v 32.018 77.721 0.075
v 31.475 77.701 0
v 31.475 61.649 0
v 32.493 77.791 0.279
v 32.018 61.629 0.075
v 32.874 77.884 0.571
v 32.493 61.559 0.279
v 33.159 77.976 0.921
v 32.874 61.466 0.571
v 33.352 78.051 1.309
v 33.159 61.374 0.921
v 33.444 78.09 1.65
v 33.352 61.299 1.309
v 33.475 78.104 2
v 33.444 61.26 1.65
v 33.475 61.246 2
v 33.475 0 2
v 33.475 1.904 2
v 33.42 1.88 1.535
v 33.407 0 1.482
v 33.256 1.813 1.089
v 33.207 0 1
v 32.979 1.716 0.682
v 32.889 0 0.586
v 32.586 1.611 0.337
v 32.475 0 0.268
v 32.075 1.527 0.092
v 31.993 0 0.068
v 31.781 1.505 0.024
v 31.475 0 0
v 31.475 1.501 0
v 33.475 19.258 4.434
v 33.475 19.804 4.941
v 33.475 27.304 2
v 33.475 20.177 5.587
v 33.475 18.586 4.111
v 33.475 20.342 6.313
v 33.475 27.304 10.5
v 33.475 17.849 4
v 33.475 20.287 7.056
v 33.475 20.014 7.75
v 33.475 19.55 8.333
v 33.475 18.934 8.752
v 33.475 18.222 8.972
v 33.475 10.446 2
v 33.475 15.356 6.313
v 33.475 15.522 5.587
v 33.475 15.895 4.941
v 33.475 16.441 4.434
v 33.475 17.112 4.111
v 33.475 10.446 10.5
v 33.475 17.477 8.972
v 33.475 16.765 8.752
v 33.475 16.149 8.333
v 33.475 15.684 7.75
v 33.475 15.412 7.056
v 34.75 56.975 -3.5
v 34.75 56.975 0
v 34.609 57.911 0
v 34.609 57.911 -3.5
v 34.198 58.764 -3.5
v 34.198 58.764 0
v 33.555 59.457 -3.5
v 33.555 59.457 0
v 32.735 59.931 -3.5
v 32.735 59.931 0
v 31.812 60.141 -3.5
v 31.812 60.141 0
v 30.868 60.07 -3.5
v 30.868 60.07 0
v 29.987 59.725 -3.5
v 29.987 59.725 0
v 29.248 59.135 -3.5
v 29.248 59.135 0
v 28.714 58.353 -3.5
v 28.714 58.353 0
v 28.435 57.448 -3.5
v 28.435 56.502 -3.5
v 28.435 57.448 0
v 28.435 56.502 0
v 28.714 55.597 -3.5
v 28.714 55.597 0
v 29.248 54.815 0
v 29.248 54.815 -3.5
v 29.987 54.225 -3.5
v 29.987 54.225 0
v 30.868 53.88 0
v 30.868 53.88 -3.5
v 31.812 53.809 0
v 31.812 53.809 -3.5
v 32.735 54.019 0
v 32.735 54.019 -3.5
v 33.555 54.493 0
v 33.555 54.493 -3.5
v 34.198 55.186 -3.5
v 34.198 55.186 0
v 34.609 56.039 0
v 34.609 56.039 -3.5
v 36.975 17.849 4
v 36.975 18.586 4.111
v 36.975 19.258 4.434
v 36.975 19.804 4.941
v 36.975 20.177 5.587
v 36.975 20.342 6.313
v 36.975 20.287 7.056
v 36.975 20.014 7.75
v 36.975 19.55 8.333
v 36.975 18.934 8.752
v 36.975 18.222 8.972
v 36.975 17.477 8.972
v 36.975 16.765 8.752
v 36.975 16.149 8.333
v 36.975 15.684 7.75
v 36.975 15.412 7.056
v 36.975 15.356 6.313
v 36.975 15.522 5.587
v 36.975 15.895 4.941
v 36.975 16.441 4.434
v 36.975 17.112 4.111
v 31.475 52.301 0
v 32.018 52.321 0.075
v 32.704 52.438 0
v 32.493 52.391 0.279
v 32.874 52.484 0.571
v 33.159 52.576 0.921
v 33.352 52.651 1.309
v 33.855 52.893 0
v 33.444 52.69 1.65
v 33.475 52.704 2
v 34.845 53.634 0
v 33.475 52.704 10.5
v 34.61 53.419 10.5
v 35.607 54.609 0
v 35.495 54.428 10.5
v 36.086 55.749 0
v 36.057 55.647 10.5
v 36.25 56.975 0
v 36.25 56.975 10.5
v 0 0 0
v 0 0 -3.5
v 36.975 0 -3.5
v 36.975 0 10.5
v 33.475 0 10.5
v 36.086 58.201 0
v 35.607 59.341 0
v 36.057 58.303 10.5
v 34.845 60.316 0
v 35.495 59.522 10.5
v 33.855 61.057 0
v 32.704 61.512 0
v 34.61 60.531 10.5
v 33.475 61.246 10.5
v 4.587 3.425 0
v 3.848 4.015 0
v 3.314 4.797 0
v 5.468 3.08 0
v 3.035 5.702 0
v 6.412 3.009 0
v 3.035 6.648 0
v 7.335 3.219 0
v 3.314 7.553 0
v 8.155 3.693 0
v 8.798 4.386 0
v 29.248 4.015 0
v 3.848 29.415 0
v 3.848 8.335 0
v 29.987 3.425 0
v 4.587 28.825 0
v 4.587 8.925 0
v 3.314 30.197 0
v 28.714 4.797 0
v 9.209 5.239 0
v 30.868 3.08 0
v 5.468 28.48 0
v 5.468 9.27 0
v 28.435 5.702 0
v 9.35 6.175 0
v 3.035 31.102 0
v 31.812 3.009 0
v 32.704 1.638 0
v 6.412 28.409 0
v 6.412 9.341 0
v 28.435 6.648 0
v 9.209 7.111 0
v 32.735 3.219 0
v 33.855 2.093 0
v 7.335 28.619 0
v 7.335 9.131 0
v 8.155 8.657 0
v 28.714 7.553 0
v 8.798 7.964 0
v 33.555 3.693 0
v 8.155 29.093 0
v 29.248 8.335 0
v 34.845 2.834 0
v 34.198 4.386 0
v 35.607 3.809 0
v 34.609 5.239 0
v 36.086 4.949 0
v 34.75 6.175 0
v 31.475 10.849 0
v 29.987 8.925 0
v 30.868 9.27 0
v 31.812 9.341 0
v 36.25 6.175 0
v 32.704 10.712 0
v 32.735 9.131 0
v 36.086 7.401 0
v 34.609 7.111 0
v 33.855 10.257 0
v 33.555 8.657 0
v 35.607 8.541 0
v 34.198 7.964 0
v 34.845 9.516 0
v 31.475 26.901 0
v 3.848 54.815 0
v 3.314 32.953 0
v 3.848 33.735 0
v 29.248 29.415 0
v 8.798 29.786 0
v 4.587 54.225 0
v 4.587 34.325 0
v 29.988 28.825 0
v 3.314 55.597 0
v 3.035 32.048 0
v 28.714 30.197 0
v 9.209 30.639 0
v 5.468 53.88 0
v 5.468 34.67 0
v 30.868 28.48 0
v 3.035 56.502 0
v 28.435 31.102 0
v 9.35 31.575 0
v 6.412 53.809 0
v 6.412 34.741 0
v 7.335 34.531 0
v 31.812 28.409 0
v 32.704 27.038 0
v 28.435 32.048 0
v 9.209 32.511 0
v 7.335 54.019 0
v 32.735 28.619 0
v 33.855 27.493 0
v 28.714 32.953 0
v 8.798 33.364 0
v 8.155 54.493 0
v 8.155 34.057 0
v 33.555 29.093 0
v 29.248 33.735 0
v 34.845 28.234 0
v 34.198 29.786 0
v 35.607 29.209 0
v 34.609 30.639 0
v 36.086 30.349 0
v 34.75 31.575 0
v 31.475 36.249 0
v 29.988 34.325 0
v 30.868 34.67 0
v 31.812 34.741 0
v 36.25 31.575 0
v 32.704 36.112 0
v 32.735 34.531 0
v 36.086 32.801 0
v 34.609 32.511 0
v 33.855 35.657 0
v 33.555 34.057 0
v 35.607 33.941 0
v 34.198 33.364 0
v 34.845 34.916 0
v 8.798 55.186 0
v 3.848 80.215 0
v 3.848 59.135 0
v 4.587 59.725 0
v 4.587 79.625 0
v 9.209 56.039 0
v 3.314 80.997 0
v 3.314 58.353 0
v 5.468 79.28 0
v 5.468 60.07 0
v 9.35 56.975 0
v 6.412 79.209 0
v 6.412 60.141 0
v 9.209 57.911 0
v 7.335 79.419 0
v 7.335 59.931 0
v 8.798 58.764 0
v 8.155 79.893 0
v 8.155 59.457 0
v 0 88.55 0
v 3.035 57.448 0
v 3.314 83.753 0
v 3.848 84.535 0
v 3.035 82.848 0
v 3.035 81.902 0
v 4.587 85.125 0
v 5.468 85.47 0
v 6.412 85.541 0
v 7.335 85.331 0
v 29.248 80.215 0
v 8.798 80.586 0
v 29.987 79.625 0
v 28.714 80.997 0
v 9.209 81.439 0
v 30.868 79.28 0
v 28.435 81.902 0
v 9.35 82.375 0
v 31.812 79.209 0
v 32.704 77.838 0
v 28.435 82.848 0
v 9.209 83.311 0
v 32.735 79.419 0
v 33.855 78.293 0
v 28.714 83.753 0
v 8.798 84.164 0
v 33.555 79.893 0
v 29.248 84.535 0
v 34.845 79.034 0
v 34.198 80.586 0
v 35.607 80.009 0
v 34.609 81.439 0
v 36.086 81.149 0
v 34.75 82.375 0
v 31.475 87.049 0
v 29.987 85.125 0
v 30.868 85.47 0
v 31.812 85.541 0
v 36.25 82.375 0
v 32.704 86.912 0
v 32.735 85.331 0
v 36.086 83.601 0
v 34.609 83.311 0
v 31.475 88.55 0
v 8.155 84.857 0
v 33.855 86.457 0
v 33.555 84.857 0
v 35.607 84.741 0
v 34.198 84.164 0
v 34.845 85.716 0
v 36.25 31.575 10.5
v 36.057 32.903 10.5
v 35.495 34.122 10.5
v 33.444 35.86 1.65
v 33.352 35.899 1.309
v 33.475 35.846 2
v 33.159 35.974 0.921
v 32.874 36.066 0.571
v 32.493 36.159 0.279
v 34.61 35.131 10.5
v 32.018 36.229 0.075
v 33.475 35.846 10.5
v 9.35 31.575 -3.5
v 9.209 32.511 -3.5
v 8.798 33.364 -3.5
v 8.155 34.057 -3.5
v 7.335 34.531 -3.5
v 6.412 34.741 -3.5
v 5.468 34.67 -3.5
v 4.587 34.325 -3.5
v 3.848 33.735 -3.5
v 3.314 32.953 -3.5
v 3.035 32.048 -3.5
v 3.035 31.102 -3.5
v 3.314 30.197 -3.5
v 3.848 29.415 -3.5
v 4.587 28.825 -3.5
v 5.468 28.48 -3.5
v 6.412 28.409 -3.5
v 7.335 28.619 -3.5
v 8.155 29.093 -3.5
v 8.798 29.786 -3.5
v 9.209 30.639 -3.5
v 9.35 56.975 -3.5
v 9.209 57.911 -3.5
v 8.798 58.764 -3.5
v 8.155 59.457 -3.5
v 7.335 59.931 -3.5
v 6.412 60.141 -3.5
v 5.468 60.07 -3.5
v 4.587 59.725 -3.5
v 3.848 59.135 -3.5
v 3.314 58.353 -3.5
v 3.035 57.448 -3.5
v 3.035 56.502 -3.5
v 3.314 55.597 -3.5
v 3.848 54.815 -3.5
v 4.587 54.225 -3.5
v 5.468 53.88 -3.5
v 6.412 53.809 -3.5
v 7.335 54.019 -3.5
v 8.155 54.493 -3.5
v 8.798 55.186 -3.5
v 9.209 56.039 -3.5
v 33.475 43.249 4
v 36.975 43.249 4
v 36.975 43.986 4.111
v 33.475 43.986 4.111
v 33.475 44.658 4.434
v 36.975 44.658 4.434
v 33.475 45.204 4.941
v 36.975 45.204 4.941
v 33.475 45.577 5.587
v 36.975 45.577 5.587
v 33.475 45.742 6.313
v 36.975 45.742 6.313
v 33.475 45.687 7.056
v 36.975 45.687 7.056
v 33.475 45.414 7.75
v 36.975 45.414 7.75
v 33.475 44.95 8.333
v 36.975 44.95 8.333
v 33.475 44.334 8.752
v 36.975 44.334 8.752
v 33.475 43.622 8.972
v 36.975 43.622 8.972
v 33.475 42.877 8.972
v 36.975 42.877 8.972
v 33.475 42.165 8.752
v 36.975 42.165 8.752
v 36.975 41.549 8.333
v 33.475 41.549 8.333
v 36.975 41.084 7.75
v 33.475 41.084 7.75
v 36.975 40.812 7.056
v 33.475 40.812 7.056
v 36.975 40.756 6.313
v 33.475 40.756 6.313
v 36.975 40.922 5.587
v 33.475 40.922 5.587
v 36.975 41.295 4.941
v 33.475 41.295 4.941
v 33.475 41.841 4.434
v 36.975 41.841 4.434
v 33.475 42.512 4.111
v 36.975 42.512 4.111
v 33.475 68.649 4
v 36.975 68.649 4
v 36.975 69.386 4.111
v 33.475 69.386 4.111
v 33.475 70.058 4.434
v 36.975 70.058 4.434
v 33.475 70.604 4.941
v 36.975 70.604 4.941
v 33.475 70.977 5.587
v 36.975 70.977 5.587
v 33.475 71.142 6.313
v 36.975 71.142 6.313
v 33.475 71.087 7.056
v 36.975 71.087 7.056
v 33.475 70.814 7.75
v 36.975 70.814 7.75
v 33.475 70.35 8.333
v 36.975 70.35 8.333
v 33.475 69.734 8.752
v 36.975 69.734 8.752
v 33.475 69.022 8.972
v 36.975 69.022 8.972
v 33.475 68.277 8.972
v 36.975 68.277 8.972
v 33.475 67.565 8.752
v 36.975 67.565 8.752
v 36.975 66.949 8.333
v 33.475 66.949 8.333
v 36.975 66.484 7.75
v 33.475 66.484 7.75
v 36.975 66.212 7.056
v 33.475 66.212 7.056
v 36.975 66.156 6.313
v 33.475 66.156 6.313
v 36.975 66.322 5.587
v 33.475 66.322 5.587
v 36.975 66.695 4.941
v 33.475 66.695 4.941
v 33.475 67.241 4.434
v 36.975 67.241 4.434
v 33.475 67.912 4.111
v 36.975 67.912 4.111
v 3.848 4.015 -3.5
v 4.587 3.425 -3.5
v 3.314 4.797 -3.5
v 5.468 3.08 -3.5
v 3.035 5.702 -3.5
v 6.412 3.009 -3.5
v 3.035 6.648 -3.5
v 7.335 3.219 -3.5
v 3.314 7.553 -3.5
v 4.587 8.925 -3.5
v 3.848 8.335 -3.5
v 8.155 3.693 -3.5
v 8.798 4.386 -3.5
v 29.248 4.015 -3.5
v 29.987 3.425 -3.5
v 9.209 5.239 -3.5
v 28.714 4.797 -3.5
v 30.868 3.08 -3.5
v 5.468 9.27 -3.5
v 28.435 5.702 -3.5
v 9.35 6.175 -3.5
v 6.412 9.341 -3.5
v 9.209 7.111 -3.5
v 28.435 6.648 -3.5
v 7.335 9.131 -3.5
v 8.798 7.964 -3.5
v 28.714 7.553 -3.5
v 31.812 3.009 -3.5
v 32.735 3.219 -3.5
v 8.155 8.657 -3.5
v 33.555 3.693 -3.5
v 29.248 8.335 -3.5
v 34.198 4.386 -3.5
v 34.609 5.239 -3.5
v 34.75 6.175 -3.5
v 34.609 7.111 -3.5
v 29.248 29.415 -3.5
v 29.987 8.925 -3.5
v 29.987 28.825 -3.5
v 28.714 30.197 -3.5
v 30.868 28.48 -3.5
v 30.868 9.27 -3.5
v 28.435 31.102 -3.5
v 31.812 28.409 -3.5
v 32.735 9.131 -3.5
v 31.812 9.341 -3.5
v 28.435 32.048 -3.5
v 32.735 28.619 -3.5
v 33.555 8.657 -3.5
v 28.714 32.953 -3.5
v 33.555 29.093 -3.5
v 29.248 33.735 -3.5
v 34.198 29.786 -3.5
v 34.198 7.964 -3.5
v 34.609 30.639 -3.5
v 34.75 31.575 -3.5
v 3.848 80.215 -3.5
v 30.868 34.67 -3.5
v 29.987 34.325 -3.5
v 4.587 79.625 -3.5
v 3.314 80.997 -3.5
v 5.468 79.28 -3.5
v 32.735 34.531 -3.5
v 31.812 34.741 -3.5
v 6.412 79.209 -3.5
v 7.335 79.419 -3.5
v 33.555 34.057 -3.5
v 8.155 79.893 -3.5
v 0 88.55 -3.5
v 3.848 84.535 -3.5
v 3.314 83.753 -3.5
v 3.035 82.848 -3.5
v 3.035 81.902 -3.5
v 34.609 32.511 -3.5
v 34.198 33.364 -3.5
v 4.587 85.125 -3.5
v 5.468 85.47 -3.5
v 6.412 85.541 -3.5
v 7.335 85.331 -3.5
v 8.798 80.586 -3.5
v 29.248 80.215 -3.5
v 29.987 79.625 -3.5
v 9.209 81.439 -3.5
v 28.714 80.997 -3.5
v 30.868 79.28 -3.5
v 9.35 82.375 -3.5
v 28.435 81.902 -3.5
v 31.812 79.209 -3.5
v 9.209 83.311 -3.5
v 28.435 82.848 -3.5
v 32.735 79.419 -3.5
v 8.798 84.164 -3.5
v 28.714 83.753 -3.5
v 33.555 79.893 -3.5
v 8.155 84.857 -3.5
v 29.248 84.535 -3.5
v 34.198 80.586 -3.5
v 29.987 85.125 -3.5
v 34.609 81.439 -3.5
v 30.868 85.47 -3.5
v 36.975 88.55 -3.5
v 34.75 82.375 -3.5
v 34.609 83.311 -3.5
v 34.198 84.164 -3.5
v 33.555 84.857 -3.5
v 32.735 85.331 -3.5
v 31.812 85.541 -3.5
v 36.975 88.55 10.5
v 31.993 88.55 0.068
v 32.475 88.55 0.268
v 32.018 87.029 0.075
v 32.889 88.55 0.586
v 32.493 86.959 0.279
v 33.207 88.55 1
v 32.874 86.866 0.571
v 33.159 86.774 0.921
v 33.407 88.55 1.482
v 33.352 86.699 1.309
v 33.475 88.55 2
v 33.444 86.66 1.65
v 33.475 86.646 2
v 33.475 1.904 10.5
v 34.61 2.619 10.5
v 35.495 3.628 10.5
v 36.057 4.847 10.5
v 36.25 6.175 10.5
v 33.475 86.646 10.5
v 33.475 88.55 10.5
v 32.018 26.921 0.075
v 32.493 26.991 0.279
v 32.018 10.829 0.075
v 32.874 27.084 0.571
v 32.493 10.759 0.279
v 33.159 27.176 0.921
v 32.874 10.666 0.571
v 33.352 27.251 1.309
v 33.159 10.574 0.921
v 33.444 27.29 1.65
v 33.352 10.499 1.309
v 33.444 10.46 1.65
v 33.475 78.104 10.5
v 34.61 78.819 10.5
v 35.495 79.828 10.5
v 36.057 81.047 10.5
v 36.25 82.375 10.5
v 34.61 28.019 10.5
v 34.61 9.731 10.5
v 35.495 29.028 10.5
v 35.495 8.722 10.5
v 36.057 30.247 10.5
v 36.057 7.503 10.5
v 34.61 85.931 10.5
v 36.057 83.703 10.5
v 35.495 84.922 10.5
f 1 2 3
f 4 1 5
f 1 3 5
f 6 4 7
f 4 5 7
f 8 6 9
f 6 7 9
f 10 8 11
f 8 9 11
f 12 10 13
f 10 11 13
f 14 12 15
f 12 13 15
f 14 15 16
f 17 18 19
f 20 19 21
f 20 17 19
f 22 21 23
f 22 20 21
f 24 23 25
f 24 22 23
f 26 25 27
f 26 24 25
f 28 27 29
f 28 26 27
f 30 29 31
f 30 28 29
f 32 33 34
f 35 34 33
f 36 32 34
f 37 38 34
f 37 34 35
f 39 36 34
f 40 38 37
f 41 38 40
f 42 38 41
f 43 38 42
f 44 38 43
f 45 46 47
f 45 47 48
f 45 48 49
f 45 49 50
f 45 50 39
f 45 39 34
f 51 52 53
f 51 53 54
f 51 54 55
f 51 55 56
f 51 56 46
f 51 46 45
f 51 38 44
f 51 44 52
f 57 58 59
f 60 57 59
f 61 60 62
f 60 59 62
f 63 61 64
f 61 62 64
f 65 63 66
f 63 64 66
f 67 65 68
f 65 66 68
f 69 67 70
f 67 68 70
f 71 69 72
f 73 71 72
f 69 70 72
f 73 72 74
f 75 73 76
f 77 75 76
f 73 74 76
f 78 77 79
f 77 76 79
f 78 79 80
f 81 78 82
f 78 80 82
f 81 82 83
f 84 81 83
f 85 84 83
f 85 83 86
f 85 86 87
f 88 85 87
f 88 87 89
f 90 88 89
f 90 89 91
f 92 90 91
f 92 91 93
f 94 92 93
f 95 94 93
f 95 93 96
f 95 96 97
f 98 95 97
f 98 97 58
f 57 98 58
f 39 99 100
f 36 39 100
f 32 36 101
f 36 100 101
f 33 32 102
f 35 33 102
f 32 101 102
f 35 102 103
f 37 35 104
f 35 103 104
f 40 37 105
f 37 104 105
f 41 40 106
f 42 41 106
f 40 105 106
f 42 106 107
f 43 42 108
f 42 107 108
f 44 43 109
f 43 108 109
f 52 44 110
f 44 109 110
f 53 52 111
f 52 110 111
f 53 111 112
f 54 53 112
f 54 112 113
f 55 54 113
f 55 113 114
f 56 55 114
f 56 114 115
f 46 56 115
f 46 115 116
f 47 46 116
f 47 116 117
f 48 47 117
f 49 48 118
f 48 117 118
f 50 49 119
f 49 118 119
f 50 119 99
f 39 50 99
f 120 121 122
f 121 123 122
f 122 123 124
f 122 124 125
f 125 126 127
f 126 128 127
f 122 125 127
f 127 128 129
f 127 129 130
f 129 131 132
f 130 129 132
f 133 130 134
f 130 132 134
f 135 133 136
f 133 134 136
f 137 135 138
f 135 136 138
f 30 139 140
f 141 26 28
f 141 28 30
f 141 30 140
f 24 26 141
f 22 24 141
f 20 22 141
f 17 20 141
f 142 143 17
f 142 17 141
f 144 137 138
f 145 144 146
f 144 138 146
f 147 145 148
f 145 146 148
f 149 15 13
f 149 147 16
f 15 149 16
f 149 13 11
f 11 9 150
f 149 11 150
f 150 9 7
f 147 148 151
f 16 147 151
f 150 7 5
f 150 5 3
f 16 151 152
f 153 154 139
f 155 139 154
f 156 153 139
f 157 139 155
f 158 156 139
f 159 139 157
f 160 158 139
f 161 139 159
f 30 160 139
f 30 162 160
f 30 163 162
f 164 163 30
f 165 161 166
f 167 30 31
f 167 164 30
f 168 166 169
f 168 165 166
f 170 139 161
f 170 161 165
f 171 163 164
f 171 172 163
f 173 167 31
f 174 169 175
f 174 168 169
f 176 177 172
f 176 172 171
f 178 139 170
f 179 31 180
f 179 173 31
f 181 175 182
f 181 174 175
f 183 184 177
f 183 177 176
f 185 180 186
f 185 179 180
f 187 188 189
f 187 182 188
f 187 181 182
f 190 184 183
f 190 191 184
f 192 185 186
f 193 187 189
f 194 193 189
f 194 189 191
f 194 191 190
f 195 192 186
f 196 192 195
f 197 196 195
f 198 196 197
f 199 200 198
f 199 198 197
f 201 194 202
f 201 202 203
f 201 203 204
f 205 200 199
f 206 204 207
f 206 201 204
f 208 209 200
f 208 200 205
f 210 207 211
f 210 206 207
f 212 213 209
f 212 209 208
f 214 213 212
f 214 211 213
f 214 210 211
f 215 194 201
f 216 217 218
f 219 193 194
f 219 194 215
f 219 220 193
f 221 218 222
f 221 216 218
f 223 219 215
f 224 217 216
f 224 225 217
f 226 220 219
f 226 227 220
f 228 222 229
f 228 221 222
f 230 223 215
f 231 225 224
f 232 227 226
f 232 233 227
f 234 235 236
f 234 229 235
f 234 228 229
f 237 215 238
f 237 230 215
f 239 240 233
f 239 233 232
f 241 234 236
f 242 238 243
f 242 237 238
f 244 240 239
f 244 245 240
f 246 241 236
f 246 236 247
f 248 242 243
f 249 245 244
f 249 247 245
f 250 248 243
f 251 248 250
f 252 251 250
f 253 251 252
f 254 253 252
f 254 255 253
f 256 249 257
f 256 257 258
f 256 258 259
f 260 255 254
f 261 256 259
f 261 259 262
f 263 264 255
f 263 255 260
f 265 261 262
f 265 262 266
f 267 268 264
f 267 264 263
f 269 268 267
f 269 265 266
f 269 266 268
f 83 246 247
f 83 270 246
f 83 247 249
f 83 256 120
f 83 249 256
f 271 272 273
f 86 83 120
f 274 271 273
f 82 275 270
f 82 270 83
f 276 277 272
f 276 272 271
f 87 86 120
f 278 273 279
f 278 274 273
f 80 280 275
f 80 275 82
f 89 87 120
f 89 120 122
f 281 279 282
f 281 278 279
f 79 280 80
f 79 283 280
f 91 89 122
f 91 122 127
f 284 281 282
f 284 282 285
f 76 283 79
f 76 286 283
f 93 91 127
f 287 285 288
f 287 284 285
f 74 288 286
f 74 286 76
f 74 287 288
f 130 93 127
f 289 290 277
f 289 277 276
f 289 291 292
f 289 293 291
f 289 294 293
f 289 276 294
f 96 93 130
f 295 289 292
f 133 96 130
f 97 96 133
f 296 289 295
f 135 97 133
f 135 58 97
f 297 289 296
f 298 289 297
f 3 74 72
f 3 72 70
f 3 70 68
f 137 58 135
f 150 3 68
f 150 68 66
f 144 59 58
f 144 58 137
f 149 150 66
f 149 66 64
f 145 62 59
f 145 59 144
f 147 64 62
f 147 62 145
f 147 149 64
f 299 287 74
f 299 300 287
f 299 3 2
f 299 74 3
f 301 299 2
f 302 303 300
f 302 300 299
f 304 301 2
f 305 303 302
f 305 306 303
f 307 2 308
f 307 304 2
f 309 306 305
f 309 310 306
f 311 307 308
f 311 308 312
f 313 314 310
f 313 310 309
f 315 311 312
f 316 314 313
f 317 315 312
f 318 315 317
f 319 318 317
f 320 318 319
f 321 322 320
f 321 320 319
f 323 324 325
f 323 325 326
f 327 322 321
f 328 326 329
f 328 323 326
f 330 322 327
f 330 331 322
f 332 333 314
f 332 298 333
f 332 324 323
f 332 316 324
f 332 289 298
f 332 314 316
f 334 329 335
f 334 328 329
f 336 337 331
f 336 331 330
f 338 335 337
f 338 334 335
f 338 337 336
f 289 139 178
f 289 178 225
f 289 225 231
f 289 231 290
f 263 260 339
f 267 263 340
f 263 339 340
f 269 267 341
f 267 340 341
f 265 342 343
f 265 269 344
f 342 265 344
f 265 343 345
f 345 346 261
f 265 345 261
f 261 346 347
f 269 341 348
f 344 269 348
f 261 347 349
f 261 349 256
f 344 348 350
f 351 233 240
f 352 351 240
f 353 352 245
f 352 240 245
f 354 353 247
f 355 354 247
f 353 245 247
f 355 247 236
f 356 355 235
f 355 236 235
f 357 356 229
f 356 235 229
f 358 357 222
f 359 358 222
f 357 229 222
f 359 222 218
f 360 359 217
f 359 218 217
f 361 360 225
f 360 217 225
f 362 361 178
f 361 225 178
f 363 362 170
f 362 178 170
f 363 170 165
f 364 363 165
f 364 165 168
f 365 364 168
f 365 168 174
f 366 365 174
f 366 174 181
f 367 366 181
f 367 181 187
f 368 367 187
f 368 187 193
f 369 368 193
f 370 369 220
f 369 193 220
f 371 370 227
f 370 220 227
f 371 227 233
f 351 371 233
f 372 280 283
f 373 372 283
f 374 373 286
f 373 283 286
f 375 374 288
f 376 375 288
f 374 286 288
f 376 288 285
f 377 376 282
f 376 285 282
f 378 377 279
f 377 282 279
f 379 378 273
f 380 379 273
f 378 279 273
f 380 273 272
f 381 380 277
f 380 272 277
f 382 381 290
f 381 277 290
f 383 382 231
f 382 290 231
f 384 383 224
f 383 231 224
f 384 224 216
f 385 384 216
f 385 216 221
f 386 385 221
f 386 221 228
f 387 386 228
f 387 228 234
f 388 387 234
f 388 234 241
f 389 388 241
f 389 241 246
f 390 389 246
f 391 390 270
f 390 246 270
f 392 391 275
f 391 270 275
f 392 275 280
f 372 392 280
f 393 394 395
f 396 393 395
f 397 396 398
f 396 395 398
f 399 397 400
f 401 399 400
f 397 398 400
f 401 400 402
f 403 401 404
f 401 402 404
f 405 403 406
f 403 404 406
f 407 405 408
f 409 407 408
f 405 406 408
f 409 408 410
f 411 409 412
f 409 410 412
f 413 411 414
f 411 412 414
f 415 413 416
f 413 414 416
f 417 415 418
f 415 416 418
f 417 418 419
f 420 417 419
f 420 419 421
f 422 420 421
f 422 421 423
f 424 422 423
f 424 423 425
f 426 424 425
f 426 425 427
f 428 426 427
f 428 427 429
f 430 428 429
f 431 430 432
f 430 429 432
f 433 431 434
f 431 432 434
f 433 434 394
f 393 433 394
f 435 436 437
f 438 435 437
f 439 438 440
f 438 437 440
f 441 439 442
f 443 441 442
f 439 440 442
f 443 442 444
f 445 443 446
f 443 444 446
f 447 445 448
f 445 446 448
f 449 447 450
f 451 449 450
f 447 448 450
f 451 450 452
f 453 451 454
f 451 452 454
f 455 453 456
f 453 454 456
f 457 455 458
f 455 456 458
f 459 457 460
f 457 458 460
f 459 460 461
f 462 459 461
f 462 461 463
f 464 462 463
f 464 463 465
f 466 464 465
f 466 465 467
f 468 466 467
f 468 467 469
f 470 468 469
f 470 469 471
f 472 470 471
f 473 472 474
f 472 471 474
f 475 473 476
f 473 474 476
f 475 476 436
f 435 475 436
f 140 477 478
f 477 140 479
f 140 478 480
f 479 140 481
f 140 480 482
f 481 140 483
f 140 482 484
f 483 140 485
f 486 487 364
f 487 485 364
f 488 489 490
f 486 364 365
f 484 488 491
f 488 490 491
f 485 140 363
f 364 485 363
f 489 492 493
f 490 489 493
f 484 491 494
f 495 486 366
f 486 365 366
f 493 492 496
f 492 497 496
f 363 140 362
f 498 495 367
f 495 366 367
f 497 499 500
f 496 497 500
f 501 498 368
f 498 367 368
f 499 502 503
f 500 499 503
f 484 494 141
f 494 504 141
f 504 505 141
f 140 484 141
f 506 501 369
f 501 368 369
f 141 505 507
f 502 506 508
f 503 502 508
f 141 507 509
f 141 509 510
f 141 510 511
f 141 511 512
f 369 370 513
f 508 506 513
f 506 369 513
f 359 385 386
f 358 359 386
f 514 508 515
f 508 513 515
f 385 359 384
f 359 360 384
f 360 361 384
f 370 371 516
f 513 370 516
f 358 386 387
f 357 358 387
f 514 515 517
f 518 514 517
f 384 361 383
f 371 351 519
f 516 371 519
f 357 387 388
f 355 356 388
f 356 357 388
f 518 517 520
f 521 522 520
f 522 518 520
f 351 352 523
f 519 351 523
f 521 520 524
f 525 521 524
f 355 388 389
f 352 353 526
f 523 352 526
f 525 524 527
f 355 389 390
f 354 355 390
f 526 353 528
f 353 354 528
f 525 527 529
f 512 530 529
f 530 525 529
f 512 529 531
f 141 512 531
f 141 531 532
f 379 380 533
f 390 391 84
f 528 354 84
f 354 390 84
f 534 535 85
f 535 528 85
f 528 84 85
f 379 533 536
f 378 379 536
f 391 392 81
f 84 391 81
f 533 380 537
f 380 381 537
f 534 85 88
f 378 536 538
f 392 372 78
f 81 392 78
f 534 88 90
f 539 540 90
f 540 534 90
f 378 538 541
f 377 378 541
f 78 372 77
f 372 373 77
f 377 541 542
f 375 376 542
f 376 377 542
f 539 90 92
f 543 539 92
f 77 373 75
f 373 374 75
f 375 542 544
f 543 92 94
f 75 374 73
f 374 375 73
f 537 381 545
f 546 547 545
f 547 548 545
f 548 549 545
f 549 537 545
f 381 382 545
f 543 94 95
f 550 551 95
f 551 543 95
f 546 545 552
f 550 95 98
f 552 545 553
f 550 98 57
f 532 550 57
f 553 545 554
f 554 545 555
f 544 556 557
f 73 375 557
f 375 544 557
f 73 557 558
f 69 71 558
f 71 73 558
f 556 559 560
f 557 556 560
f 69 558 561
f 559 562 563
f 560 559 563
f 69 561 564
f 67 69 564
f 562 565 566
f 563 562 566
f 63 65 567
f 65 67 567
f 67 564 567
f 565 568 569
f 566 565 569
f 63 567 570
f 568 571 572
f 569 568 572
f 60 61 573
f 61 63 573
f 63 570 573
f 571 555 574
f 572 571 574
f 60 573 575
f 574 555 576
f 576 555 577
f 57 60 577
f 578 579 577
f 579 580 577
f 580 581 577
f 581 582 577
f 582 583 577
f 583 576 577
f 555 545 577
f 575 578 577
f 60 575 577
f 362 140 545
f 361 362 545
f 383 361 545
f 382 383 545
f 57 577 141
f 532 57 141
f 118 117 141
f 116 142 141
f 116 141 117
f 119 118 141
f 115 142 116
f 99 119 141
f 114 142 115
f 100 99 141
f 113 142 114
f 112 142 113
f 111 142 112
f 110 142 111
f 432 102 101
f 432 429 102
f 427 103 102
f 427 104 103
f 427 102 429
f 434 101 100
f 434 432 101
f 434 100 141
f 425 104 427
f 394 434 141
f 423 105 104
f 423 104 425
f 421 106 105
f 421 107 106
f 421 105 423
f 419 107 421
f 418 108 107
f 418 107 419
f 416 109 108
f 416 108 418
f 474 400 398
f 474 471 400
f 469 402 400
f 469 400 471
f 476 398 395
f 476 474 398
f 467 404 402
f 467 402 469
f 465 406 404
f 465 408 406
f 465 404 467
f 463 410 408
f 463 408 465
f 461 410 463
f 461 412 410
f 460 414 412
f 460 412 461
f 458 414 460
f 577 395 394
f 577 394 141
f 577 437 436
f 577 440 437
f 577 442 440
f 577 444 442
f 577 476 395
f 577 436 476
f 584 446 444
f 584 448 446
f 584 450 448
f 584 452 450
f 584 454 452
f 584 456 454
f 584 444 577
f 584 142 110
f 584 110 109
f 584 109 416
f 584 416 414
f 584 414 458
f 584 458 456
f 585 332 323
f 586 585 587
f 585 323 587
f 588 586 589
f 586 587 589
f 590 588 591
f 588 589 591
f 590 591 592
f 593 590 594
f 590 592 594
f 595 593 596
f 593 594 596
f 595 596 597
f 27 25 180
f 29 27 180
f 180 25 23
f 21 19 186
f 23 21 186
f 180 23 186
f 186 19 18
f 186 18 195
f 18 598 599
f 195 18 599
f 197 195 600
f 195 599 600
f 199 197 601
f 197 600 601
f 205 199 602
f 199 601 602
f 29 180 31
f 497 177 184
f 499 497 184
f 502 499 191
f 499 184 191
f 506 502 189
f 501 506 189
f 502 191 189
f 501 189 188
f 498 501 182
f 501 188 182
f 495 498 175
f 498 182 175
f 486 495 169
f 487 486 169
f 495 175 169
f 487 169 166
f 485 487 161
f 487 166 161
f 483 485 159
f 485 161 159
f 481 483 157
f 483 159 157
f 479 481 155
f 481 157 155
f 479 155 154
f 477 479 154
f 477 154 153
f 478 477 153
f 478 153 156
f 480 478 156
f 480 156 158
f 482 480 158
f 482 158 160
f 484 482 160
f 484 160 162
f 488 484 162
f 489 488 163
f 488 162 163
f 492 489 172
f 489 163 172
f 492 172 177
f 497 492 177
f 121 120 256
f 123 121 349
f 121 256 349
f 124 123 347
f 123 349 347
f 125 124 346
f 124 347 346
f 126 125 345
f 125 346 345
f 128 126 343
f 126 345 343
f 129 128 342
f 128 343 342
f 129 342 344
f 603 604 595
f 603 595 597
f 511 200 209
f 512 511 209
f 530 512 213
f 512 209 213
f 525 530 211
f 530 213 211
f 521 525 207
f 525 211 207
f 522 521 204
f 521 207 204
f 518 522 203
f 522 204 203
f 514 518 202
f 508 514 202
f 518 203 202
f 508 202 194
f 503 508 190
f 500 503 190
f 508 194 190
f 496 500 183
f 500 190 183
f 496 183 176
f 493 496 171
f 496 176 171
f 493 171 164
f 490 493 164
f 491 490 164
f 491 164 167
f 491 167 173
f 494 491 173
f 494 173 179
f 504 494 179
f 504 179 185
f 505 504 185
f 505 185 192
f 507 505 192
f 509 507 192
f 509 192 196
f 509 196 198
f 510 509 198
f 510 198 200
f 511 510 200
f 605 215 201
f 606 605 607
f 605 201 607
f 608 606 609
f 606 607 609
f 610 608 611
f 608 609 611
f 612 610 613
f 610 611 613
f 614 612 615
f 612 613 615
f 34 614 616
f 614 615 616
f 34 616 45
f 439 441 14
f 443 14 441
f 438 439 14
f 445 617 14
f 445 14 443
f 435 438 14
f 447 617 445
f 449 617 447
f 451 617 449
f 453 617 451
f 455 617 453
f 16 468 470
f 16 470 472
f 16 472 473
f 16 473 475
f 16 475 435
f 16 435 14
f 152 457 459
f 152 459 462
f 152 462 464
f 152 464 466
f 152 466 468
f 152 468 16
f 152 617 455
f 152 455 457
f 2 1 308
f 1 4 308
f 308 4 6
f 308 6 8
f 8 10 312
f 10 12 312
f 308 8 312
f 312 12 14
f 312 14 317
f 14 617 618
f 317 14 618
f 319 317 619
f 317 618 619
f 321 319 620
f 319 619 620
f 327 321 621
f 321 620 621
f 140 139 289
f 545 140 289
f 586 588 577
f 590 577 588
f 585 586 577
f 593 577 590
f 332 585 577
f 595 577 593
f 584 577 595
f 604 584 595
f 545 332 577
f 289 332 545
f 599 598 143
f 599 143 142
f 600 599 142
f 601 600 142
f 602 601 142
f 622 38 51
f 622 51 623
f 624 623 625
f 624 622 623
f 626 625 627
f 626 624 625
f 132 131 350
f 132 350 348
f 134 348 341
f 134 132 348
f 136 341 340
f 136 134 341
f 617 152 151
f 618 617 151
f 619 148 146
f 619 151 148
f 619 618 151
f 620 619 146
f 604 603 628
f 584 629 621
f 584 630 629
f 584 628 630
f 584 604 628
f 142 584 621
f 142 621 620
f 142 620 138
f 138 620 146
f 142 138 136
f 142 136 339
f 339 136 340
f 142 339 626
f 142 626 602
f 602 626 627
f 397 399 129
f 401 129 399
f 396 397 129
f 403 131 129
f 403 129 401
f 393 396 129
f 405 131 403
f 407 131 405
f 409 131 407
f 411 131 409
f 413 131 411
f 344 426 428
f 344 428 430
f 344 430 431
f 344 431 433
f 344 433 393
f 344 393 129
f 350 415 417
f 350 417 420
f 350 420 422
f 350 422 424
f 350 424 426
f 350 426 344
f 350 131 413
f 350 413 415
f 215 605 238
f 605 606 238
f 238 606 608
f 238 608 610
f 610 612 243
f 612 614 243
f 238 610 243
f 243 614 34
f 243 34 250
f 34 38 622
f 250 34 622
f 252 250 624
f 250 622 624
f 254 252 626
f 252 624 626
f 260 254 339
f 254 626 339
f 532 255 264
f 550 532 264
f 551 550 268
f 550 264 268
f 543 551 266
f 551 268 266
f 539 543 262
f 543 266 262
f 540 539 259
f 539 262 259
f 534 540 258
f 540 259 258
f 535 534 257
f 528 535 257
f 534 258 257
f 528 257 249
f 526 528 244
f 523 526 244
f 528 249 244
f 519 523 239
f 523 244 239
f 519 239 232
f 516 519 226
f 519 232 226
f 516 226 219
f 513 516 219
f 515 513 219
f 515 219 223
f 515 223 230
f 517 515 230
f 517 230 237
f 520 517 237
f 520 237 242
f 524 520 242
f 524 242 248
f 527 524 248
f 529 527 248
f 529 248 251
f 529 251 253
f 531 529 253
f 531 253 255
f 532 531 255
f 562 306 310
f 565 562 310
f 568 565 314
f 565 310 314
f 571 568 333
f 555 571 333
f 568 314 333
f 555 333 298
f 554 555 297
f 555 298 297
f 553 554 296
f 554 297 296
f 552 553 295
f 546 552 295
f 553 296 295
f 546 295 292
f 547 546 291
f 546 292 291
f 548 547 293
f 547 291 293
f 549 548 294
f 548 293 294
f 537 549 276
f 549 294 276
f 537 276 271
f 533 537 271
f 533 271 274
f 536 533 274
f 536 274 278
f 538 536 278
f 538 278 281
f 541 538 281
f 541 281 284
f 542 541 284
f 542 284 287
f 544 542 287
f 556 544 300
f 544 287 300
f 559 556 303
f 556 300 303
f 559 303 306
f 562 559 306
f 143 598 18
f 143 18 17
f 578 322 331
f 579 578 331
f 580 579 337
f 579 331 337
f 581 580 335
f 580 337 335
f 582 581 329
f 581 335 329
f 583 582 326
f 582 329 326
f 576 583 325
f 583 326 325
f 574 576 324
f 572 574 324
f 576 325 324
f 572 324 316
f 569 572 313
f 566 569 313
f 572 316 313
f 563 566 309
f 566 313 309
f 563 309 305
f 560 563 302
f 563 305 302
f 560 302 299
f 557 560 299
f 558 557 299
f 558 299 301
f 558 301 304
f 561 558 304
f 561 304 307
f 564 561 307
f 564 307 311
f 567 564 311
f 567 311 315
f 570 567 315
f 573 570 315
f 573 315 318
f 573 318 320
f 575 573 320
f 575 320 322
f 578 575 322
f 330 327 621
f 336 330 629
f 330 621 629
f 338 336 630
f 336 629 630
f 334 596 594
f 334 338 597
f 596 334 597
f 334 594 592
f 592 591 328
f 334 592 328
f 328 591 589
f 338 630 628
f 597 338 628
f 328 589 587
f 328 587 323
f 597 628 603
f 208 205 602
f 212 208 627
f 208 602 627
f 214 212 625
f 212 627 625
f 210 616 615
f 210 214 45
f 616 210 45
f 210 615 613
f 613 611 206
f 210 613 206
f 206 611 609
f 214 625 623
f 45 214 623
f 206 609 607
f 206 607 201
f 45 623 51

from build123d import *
from build123d.topology import SkipClean

# Parameters (mm, degrees)
SKETCH1_W           = 36.97504
SKETCH1_H           = 88.55
SKETCH1_R           = 3.175
BOSS_EXTRUDE1_DEPTH = 3.5
BOSS_EXTRUDE3_START = 10.5
BOSS_EXTRUDE3_DEPTH = 10.5
CUT_EXTRUDE1_START  = 10.5
CUT_EXTRUDE1_DEPTH  = 10.5
SKETCH2_R           = 2.5
CUT_EXTRUDE2_DEPTH  = 3.5
FILLET1_R           = 2


with BuildPart() as part:
    # Sketch1 → Boss-Extrude1 (new body)
    with BuildSketch(Plane.XY):
        with Locations((18.48752, 44.275)):
            Rectangle(SKETCH1_W, SKETCH1_H)
        with Locations((31.575, 82.375)):
            Circle(SKETCH1_R, mode=Mode.SUBTRACT)
        with Locations((31.575, 56.975)):
            Circle(SKETCH1_R, mode=Mode.SUBTRACT)
        with Locations((31.575, 31.575)):
            Circle(SKETCH1_R, mode=Mode.SUBTRACT)
        with Locations((31.575, 6.175)):
            Circle(SKETCH1_R, mode=Mode.SUBTRACT)
        with Locations((6.175, 6.175)):
            Circle(SKETCH1_R, mode=Mode.SUBTRACT)
        with Locations((6.175, 31.575)):
            Circle(SKETCH1_R, mode=Mode.SUBTRACT)
        with Locations((6.175, 56.975)):
            Circle(SKETCH1_R, mode=Mode.SUBTRACT)
        with Locations((6.175, 82.375)):
            Circle(SKETCH1_R, mode=Mode.SUBTRACT)
    extrude(amount=-BOSS_EXTRUDE1_DEPTH)

    # Sketch1<4> → Boss-Extrude3 (add)
    with SkipClean():  # the faces are left unmerged after this step: merging them gives an invalid solid
        with BuildSketch(Plane.XY.offset(BOSS_EXTRUDE3_START)):
            with BuildLine():
                Line((33.47504, 0), (36.97504, 0))
                Line((36.97504, 0), (36.97504, 88.55))
                Line((36.97504, 88.55), (33.47504, 88.55))
                Line((33.47504, 88.55), (33.47504, 84.918712444))
                ThreePointArc((33.47504, 84.918712444), (34.75, 82.375), (33.47504, 79.831287556))
                Line((33.47504, 79.831287556), (33.47504, 59.518712444))
                ThreePointArc((33.47504, 59.518712444), (34.75, 56.975), (33.47504, 54.431287556))
                Line((33.47504, 54.431287556), (33.47504, 34.118712444))
                ThreePointArc((33.47504, 34.118712444), (34.75, 31.575), (33.47504, 29.031287556))
                Line((33.47504, 29.031287556), (33.47504, 8.718712444))
                ThreePointArc((33.47504, 8.718712444), (34.75, 6.175), (33.47504, 3.631287556))
                Line((33.47504, 3.631287556), (33.47504, 0))
            make_face()
        extrude(amount=-BOSS_EXTRUDE3_DEPTH)

    # Sketch1<5> → Cut-Extrude1 (cut)
    with BuildSketch(Plane.XY.offset(CUT_EXTRUDE1_START)):
        with BuildLine():
            ThreePointArc((36.25, 82.375), (35.495351515, 84.921854727), (33.47504, 86.646471994))
            Line((33.47504, 86.646471994), (33.47504, 84.918712444))
            ThreePointArc((33.47504, 84.918712444), (34.413419631, 83.797673188), (34.75, 82.375))
            ThreePointArc((34.75, 82.375), (34.413419631, 80.952326812), (33.47504, 79.831287556))
            Line((33.47504, 79.831287556), (33.47504, 78.103528006))
            ThreePointArc((33.47504, 78.103528006), (35.495351515, 79.828145273), (36.25, 82.375))
        make_face()
        with BuildLine():
            Line((33.47504, 84.918712444), (33.47504, 86.646471994))
            ThreePointArc((33.47504, 86.646471994), (26.9, 82.375), (33.47504, 78.103528006))
            Line((33.47504, 78.103528006), (33.47504, 79.831287556))
            ThreePointArc((33.47504, 79.831287556), (28.4, 82.375), (33.47504, 84.918712444))
        make_face()
        with BuildLine():
            ThreePointArc((36.25, 56.975), (35.495351515, 59.521854727), (33.47504, 61.246471994))
            Line((33.47504, 61.246471994), (33.47504, 59.518712444))
            ThreePointArc((33.47504, 59.518712444), (34.413419631, 58.397673188), (34.75, 56.975))
            ThreePointArc((34.75, 56.975), (34.413419631, 55.552326812), (33.47504, 54.431287556))
            Line((33.47504, 54.431287556), (33.47504, 52.703528006))
            ThreePointArc((33.47504, 52.703528006), (35.495351515, 54.428145273), (36.25, 56.975))
        make_face()
        with BuildLine():
            Line((33.47504, 59.518712444), (33.47504, 61.246471994))
            ThreePointArc((33.47504, 61.246471994), (26.9, 56.975), (33.47504, 52.703528006))
            Line((33.47504, 52.703528006), (33.47504, 54.431287556))
            ThreePointArc((33.47504, 54.431287556), (28.4, 56.975), (33.47504, 59.518712444))
        make_face()
        with BuildLine():
            ThreePointArc((33.47504, 35.846471994), (26.9, 31.575), (33.47504, 27.303528006))
            Line((33.47504, 27.303528006), (33.47504, 29.031287556))
            ThreePointArc((33.47504, 29.031287556), (28.4, 31.575), (33.47504, 34.118712444))
            Line((33.47504, 34.118712444), (33.47504, 35.846471994))
        make_face()
        with BuildLine():
            Line((33.47504, 29.031287556), (33.47504, 27.303528006))
            ThreePointArc((33.47504, 27.303528006), (35.495351515, 29.028145273), (36.25, 31.575))
            ThreePointArc((36.25, 31.575), (35.495351515, 34.121854727), (33.47504, 35.846471994))
            Line((33.47504, 35.846471994), (33.47504, 34.118712444))
            ThreePointArc((33.47504, 34.118712444), (34.413419631, 32.997673188), (34.75, 31.575))
            ThreePointArc((34.75, 31.575), (34.413419631, 30.152326812), (33.47504, 29.031287556))
        make_face()
        with BuildLine():
            ThreePointArc((33.47504, 10.446471994), (26.9, 6.175), (33.47504, 1.903528006))
            Line((33.47504, 1.903528006), (33.47504, 3.631287556))
            ThreePointArc((33.47504, 3.631287556), (28.4, 6.175), (33.47504, 8.718712444))
            Line((33.47504, 8.718712444), (33.47504, 10.446471994))
        make_face()
        with BuildLine():
            Line((33.47504, 3.631287556), (33.47504, 1.903528006))
            ThreePointArc((33.47504, 1.903528006), (35.495351515, 3.628145273), (36.25, 6.175))
            ThreePointArc((36.25, 6.175), (35.495351515, 8.721854727), (33.47504, 10.446471994))
            Line((33.47504, 10.446471994), (33.47504, 8.718712444))
            ThreePointArc((33.47504, 8.718712444), (34.413419631, 7.597673188), (34.75, 6.175))
            ThreePointArc((34.75, 6.175), (34.413419631, 4.752326812), (33.47504, 3.631287556))
        make_face()
    extrude(amount=-CUT_EXTRUDE1_DEPTH, mode=Mode.SUBTRACT)

    # Sketch2 → Cut-Extrude2 (cut)
    with BuildSketch(Plane(origin=(36.97504, 0, 0), x_dir=(0, 0, -1), z_dir=(1, 0, 0))):
        with Locations((-6.5, 17.849330816)):
            Circle(SKETCH2_R)
        with Locations((-6.5, 43.249330816)):
            Circle(SKETCH2_R)
        with Locations((-6.5, 68.649330816)):
            Circle(SKETCH2_R)
    extrude(amount=-CUT_EXTRUDE2_DEPTH, mode=Mode.SUBTRACT)

    # Fillet1
    fillet1_edges = [part.edges().sort_by_distance(p)[0] for p in [
        (33.47504, 44.275, 0),
        (33.47504, 18.875, 0),
        (33.47504, 0.951764003, 0),
        (33.47504, 87.598235997, 0),
        (33.47504, 69.675, 0),
    ]]
    fillet(fillet1_edges, radius=FILLET1_R)


solid = part.part
